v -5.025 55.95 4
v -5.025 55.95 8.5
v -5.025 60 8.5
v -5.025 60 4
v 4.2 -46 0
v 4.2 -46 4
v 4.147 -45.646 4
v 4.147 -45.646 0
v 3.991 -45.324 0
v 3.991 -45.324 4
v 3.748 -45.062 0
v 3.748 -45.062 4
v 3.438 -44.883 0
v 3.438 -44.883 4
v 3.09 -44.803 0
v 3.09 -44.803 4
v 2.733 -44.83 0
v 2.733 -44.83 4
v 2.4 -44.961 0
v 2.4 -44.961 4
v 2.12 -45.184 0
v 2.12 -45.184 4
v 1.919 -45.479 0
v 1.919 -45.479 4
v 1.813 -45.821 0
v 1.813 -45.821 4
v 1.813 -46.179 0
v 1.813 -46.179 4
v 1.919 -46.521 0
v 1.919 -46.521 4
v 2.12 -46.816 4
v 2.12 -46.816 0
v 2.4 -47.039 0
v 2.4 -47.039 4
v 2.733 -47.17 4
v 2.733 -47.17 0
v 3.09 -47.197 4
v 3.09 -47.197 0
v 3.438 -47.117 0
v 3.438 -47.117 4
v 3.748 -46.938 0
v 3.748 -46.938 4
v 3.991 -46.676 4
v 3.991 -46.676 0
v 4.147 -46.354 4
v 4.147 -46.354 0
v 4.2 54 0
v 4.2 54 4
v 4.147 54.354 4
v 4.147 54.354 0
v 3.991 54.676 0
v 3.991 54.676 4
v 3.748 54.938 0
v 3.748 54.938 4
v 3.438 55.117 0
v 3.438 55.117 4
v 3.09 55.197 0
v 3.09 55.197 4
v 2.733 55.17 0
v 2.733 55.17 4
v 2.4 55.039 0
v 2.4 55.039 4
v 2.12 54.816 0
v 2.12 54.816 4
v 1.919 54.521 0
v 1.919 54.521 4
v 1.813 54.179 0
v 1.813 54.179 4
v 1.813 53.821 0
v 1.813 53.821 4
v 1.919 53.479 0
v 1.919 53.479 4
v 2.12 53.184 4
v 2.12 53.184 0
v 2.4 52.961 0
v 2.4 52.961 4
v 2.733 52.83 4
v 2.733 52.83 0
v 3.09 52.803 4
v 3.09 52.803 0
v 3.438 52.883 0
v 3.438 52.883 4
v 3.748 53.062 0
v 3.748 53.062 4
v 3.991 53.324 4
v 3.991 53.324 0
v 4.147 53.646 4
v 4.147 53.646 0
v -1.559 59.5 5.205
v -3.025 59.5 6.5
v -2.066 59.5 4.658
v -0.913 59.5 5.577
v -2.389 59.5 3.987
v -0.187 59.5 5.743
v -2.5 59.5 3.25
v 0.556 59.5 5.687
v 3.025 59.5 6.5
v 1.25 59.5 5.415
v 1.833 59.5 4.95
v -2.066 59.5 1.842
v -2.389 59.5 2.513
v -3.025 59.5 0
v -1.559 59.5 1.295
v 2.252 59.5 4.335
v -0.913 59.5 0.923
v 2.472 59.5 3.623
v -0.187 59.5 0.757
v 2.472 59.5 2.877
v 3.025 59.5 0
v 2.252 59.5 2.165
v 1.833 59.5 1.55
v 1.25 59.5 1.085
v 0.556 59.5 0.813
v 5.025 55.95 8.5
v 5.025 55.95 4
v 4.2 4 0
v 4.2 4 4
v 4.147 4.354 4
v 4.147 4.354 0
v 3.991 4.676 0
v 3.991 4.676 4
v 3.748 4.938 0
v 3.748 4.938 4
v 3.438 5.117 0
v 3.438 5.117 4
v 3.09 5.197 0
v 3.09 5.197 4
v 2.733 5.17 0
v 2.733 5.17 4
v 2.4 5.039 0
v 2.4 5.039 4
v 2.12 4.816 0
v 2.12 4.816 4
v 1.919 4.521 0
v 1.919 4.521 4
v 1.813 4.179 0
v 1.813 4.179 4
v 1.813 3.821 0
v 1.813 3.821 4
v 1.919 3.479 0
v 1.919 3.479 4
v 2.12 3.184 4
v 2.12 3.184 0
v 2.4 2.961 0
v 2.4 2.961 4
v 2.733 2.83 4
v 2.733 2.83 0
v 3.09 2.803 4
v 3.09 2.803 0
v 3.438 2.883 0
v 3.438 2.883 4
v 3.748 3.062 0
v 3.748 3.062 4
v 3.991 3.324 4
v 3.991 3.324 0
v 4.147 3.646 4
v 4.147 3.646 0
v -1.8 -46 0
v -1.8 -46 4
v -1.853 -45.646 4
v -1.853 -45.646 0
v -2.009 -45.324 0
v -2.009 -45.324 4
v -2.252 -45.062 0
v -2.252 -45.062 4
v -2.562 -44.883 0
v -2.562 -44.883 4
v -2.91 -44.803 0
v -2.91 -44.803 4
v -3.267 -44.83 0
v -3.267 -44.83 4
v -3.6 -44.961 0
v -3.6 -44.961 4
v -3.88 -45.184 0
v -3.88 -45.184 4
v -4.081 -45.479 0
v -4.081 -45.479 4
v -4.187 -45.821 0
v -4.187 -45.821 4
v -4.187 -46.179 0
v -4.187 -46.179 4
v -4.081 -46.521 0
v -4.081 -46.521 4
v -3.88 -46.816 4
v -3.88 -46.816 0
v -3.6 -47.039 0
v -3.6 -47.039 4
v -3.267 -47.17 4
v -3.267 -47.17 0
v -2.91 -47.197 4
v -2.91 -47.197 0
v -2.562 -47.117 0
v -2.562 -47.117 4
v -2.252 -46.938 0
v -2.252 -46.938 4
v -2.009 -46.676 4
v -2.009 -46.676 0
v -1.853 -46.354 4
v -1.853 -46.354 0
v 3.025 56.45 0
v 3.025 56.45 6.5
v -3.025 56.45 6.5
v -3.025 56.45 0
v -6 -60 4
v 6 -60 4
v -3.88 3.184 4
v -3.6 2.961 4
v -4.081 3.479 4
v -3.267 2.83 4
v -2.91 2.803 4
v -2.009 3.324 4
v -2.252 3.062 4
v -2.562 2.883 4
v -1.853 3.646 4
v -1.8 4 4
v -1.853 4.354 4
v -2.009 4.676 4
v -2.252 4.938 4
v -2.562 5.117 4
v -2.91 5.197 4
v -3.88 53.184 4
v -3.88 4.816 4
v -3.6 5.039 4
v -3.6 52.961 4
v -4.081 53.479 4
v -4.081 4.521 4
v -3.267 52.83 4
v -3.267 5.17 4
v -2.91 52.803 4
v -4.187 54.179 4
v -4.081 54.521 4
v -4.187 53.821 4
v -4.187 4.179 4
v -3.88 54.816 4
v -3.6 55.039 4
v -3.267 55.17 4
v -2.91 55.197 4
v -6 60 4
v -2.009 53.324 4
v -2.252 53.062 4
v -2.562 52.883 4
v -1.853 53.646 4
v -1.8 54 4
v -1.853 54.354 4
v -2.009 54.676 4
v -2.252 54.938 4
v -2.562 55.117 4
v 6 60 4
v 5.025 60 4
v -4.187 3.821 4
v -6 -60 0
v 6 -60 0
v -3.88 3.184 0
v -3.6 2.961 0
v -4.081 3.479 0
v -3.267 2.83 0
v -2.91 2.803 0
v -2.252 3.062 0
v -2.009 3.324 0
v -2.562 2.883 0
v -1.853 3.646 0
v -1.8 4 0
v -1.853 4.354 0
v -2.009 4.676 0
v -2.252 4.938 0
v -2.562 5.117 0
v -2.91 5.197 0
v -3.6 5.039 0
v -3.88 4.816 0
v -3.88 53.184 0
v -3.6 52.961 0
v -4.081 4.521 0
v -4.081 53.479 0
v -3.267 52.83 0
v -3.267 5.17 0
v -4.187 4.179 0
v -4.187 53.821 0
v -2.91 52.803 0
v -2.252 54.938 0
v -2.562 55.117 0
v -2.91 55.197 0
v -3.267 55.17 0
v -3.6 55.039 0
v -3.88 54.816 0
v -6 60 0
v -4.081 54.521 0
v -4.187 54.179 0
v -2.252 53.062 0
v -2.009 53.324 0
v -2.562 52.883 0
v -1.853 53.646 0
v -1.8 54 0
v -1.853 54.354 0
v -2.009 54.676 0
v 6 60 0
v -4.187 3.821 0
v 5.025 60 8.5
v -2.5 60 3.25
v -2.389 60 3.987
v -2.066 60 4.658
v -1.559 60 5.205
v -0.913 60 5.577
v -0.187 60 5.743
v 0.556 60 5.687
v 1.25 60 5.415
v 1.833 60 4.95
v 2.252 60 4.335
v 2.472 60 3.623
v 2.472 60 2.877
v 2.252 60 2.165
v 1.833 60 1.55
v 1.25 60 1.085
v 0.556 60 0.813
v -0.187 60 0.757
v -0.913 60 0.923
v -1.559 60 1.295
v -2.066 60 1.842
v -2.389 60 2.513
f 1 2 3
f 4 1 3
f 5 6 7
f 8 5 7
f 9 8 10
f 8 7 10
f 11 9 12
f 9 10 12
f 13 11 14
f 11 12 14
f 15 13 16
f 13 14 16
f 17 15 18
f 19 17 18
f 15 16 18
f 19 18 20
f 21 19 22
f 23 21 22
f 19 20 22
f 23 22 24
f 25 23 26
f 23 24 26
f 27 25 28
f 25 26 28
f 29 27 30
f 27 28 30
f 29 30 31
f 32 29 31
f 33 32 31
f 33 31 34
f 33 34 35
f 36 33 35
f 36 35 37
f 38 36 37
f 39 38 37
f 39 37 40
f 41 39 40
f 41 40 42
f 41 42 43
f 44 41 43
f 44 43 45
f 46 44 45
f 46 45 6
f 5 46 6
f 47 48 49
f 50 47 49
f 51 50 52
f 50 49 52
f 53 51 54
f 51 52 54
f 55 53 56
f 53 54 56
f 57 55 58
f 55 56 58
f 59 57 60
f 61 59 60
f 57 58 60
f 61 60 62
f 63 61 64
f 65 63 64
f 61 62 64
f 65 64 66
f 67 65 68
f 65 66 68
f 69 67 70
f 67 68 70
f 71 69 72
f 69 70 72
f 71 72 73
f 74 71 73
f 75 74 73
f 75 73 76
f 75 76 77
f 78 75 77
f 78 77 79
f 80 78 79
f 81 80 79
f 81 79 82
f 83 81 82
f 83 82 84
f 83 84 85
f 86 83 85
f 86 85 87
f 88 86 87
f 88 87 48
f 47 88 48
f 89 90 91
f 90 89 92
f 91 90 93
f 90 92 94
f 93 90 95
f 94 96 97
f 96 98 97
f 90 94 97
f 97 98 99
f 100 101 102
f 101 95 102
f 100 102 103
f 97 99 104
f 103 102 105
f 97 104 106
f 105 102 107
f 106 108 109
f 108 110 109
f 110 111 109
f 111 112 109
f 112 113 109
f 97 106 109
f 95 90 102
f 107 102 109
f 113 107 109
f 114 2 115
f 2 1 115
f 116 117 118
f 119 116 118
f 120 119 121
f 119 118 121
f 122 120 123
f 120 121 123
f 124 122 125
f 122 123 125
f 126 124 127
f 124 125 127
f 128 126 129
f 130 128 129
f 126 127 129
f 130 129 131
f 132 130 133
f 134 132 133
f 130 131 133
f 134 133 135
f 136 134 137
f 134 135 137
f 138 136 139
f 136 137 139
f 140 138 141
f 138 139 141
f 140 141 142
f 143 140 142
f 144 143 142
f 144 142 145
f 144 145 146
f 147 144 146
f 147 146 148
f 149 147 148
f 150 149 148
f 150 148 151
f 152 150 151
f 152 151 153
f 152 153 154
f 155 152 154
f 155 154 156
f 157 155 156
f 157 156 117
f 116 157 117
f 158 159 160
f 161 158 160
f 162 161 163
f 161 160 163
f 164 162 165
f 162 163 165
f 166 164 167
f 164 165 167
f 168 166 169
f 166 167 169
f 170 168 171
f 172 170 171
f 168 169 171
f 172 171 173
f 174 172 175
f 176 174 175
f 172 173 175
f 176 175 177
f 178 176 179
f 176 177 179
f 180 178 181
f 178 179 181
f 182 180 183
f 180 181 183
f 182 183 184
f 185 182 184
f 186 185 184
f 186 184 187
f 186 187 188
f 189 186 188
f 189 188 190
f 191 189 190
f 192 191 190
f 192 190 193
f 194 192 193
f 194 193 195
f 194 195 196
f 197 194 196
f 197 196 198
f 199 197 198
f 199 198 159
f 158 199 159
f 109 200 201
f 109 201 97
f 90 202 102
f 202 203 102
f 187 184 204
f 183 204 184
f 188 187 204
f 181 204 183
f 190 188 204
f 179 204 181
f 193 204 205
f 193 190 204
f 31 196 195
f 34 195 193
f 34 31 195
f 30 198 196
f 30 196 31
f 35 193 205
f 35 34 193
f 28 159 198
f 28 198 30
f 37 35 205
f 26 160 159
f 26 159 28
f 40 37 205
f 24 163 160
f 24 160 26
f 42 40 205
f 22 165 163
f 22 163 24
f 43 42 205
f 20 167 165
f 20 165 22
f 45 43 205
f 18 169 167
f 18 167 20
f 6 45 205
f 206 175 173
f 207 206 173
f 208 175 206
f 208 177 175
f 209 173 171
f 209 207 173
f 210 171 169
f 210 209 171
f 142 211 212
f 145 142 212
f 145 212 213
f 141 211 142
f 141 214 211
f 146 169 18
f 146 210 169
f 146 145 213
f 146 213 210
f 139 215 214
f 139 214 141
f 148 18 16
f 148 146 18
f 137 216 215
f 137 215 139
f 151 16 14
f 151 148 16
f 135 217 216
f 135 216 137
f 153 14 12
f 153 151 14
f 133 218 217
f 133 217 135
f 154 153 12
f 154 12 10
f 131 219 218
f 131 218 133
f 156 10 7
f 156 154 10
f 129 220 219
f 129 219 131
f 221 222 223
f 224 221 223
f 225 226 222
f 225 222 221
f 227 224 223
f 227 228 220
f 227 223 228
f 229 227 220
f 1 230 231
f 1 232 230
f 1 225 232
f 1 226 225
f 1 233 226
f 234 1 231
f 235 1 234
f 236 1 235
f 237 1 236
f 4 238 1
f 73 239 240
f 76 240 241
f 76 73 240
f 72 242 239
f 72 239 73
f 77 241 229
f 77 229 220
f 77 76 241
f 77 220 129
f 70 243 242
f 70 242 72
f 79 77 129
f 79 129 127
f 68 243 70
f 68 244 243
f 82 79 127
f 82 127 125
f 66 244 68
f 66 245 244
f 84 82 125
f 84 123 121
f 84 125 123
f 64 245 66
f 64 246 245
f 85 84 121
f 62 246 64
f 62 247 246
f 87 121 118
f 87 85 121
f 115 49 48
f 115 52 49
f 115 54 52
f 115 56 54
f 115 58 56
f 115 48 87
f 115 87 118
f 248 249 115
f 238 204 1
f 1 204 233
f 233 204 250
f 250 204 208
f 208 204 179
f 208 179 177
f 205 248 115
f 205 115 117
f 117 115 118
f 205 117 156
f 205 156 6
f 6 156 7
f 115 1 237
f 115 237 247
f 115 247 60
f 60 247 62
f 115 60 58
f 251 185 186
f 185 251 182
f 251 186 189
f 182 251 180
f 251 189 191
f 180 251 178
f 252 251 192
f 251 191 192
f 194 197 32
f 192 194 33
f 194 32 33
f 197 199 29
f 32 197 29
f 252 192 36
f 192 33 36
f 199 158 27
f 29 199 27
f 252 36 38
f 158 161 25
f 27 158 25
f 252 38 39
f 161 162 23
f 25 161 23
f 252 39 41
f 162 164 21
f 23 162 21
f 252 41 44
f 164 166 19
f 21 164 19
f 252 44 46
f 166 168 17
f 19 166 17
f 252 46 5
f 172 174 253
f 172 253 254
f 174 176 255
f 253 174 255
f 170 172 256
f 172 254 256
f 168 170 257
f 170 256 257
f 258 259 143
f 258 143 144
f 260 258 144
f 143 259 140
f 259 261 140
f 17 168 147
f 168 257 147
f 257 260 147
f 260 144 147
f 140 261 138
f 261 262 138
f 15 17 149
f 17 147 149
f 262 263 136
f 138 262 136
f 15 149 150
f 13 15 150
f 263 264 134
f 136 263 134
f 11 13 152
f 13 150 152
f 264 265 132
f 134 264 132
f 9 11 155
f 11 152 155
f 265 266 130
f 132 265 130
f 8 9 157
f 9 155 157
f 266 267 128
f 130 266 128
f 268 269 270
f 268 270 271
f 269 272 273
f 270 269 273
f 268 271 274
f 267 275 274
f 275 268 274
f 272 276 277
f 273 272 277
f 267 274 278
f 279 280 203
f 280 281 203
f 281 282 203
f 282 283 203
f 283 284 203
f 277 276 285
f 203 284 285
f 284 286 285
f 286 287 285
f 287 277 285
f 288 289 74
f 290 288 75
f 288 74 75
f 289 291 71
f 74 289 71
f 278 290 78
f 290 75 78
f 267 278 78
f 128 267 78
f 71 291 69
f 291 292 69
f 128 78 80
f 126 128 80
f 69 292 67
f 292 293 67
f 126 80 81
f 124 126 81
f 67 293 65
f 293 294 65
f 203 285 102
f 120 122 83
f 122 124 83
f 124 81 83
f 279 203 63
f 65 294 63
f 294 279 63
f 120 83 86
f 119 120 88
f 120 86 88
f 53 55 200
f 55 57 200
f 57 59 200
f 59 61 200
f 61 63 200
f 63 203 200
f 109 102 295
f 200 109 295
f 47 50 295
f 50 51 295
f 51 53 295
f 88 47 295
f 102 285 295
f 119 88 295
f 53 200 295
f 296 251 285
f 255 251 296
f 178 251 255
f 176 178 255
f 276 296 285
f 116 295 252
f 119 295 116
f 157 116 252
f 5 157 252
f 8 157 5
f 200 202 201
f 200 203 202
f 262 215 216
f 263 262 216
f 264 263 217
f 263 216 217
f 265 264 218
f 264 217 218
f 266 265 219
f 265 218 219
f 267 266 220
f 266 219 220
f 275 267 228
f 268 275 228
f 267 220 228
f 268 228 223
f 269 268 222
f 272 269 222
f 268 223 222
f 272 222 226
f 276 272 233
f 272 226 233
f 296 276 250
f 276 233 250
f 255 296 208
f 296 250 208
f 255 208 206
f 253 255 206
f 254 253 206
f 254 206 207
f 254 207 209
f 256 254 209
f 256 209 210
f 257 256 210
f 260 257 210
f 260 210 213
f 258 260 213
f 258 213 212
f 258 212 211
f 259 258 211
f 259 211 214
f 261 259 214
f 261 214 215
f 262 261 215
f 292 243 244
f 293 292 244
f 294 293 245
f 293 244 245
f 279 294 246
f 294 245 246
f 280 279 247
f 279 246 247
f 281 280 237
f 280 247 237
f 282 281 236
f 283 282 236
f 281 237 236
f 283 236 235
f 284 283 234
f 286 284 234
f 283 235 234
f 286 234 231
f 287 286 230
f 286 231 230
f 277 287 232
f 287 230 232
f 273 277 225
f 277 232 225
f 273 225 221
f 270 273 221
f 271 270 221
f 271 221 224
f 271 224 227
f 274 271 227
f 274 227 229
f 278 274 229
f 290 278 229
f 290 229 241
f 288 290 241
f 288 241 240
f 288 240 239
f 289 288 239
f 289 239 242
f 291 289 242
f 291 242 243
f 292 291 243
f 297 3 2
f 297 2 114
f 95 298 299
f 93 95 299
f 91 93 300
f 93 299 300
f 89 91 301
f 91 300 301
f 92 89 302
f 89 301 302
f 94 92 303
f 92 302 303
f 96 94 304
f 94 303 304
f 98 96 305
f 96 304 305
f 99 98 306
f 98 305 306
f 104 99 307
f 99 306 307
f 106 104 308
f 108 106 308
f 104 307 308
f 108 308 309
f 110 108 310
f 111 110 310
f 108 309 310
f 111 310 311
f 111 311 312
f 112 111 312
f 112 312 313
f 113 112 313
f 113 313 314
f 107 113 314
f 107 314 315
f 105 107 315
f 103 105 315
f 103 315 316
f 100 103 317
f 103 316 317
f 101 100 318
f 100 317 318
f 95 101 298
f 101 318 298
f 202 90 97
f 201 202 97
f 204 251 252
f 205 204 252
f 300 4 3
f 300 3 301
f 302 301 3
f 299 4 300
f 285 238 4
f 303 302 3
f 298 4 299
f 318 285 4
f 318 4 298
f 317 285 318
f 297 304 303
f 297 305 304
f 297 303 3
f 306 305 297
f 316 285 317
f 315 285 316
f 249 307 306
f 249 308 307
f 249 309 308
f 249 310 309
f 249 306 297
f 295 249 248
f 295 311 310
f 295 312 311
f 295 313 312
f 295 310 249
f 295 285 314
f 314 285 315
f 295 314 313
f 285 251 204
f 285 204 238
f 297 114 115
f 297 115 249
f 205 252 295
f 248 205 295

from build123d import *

# Parameters (mm, degrees)
SKETCH_W      = 12
SKETCH_H      = 120
SKETCH_W_2    = 6.05
SKETCH_H_2    = 3.05
PAD_DEPTH     = 4
SKETCH001_R   = 1.2
HOLE_DEPTH    = 25
SKETCH002_W   = 10.05
SKETCH002_H   = 4.05
SKETCH002_W_2 = 6.05
SKETCH002_H_2 = 3.05
PAD001_DEPTH  = 2.5
SKETCH003_W   = 10.05
SKETCH003_H   = 4.05
PAD002_DEPTH  = 2
SKETCH004_R   = 2.5
POCKET_DEPTH  = 0.5


with BuildPart() as part:
    # Sketch → Pad (new body)
    with BuildSketch(Plane.XY):
        Rectangle(SKETCH_W, SKETCH_H)
        with Locations((0, 57.975)):
            Rectangle(SKETCH_W_2, SKETCH_H_2, mode=Mode.SUBTRACT)
    extrude(amount=PAD_DEPTH)

    # Sketch001 (on Face10 of Pad) → Hole (cut)
    with BuildSketch(Plane.XY.offset(4)):
        with Locations((3, 54)):
            Circle(SKETCH001_R)
        with Locations((3, 4)):
            Circle(SKETCH001_R)
        with Locations((3, -46)):
            Circle(SKETCH001_R)
        with Locations((-3, 54)):
            Circle(SKETCH001_R)
        with Locations((-3, 4)):
            Circle(SKETCH001_R)
        with Locations((-3, -46)):
            Circle(SKETCH001_R)
    extrude(amount=-HOLE_DEPTH, mode=Mode.SUBTRACT)

    # Sketch002 (on Face5 of Hole) → Pad001 (join)
    with BuildSketch(Plane.XY.offset(4)):
        with Locations((0, 57.975)):
            Rectangle(SKETCH002_W, SKETCH002_H)
        with Locations((0, 57.975)):
            Rectangle(SKETCH002_W_2, SKETCH002_H_2, mode=Mode.SUBTRACT)
    extrude(amount=PAD001_DEPTH)

    # Sketch003 (on Face15 of Pad001) → Pad002 (join)
    with BuildSketch(Plane.XY.offset(6.5)):
        with Locations((0, 57.975)):
            Rectangle(SKETCH003_W, SKETCH003_H)
    extrude(amount=PAD002_DEPTH)

    # Sketch004 (on Face17 of Pad002) → Pocket (cut)
    with BuildSketch(Plane(origin=(0, 60, 0), x_dir=(-1, 0, 0), z_dir=(0, 1, 0))):
        with Locations((0, 3.25)):
            Circle(SKETCH004_R)
    extrude(amount=-POCKET_DEPTH, mode=Mode.SUBTRACT)


solid = part.part
